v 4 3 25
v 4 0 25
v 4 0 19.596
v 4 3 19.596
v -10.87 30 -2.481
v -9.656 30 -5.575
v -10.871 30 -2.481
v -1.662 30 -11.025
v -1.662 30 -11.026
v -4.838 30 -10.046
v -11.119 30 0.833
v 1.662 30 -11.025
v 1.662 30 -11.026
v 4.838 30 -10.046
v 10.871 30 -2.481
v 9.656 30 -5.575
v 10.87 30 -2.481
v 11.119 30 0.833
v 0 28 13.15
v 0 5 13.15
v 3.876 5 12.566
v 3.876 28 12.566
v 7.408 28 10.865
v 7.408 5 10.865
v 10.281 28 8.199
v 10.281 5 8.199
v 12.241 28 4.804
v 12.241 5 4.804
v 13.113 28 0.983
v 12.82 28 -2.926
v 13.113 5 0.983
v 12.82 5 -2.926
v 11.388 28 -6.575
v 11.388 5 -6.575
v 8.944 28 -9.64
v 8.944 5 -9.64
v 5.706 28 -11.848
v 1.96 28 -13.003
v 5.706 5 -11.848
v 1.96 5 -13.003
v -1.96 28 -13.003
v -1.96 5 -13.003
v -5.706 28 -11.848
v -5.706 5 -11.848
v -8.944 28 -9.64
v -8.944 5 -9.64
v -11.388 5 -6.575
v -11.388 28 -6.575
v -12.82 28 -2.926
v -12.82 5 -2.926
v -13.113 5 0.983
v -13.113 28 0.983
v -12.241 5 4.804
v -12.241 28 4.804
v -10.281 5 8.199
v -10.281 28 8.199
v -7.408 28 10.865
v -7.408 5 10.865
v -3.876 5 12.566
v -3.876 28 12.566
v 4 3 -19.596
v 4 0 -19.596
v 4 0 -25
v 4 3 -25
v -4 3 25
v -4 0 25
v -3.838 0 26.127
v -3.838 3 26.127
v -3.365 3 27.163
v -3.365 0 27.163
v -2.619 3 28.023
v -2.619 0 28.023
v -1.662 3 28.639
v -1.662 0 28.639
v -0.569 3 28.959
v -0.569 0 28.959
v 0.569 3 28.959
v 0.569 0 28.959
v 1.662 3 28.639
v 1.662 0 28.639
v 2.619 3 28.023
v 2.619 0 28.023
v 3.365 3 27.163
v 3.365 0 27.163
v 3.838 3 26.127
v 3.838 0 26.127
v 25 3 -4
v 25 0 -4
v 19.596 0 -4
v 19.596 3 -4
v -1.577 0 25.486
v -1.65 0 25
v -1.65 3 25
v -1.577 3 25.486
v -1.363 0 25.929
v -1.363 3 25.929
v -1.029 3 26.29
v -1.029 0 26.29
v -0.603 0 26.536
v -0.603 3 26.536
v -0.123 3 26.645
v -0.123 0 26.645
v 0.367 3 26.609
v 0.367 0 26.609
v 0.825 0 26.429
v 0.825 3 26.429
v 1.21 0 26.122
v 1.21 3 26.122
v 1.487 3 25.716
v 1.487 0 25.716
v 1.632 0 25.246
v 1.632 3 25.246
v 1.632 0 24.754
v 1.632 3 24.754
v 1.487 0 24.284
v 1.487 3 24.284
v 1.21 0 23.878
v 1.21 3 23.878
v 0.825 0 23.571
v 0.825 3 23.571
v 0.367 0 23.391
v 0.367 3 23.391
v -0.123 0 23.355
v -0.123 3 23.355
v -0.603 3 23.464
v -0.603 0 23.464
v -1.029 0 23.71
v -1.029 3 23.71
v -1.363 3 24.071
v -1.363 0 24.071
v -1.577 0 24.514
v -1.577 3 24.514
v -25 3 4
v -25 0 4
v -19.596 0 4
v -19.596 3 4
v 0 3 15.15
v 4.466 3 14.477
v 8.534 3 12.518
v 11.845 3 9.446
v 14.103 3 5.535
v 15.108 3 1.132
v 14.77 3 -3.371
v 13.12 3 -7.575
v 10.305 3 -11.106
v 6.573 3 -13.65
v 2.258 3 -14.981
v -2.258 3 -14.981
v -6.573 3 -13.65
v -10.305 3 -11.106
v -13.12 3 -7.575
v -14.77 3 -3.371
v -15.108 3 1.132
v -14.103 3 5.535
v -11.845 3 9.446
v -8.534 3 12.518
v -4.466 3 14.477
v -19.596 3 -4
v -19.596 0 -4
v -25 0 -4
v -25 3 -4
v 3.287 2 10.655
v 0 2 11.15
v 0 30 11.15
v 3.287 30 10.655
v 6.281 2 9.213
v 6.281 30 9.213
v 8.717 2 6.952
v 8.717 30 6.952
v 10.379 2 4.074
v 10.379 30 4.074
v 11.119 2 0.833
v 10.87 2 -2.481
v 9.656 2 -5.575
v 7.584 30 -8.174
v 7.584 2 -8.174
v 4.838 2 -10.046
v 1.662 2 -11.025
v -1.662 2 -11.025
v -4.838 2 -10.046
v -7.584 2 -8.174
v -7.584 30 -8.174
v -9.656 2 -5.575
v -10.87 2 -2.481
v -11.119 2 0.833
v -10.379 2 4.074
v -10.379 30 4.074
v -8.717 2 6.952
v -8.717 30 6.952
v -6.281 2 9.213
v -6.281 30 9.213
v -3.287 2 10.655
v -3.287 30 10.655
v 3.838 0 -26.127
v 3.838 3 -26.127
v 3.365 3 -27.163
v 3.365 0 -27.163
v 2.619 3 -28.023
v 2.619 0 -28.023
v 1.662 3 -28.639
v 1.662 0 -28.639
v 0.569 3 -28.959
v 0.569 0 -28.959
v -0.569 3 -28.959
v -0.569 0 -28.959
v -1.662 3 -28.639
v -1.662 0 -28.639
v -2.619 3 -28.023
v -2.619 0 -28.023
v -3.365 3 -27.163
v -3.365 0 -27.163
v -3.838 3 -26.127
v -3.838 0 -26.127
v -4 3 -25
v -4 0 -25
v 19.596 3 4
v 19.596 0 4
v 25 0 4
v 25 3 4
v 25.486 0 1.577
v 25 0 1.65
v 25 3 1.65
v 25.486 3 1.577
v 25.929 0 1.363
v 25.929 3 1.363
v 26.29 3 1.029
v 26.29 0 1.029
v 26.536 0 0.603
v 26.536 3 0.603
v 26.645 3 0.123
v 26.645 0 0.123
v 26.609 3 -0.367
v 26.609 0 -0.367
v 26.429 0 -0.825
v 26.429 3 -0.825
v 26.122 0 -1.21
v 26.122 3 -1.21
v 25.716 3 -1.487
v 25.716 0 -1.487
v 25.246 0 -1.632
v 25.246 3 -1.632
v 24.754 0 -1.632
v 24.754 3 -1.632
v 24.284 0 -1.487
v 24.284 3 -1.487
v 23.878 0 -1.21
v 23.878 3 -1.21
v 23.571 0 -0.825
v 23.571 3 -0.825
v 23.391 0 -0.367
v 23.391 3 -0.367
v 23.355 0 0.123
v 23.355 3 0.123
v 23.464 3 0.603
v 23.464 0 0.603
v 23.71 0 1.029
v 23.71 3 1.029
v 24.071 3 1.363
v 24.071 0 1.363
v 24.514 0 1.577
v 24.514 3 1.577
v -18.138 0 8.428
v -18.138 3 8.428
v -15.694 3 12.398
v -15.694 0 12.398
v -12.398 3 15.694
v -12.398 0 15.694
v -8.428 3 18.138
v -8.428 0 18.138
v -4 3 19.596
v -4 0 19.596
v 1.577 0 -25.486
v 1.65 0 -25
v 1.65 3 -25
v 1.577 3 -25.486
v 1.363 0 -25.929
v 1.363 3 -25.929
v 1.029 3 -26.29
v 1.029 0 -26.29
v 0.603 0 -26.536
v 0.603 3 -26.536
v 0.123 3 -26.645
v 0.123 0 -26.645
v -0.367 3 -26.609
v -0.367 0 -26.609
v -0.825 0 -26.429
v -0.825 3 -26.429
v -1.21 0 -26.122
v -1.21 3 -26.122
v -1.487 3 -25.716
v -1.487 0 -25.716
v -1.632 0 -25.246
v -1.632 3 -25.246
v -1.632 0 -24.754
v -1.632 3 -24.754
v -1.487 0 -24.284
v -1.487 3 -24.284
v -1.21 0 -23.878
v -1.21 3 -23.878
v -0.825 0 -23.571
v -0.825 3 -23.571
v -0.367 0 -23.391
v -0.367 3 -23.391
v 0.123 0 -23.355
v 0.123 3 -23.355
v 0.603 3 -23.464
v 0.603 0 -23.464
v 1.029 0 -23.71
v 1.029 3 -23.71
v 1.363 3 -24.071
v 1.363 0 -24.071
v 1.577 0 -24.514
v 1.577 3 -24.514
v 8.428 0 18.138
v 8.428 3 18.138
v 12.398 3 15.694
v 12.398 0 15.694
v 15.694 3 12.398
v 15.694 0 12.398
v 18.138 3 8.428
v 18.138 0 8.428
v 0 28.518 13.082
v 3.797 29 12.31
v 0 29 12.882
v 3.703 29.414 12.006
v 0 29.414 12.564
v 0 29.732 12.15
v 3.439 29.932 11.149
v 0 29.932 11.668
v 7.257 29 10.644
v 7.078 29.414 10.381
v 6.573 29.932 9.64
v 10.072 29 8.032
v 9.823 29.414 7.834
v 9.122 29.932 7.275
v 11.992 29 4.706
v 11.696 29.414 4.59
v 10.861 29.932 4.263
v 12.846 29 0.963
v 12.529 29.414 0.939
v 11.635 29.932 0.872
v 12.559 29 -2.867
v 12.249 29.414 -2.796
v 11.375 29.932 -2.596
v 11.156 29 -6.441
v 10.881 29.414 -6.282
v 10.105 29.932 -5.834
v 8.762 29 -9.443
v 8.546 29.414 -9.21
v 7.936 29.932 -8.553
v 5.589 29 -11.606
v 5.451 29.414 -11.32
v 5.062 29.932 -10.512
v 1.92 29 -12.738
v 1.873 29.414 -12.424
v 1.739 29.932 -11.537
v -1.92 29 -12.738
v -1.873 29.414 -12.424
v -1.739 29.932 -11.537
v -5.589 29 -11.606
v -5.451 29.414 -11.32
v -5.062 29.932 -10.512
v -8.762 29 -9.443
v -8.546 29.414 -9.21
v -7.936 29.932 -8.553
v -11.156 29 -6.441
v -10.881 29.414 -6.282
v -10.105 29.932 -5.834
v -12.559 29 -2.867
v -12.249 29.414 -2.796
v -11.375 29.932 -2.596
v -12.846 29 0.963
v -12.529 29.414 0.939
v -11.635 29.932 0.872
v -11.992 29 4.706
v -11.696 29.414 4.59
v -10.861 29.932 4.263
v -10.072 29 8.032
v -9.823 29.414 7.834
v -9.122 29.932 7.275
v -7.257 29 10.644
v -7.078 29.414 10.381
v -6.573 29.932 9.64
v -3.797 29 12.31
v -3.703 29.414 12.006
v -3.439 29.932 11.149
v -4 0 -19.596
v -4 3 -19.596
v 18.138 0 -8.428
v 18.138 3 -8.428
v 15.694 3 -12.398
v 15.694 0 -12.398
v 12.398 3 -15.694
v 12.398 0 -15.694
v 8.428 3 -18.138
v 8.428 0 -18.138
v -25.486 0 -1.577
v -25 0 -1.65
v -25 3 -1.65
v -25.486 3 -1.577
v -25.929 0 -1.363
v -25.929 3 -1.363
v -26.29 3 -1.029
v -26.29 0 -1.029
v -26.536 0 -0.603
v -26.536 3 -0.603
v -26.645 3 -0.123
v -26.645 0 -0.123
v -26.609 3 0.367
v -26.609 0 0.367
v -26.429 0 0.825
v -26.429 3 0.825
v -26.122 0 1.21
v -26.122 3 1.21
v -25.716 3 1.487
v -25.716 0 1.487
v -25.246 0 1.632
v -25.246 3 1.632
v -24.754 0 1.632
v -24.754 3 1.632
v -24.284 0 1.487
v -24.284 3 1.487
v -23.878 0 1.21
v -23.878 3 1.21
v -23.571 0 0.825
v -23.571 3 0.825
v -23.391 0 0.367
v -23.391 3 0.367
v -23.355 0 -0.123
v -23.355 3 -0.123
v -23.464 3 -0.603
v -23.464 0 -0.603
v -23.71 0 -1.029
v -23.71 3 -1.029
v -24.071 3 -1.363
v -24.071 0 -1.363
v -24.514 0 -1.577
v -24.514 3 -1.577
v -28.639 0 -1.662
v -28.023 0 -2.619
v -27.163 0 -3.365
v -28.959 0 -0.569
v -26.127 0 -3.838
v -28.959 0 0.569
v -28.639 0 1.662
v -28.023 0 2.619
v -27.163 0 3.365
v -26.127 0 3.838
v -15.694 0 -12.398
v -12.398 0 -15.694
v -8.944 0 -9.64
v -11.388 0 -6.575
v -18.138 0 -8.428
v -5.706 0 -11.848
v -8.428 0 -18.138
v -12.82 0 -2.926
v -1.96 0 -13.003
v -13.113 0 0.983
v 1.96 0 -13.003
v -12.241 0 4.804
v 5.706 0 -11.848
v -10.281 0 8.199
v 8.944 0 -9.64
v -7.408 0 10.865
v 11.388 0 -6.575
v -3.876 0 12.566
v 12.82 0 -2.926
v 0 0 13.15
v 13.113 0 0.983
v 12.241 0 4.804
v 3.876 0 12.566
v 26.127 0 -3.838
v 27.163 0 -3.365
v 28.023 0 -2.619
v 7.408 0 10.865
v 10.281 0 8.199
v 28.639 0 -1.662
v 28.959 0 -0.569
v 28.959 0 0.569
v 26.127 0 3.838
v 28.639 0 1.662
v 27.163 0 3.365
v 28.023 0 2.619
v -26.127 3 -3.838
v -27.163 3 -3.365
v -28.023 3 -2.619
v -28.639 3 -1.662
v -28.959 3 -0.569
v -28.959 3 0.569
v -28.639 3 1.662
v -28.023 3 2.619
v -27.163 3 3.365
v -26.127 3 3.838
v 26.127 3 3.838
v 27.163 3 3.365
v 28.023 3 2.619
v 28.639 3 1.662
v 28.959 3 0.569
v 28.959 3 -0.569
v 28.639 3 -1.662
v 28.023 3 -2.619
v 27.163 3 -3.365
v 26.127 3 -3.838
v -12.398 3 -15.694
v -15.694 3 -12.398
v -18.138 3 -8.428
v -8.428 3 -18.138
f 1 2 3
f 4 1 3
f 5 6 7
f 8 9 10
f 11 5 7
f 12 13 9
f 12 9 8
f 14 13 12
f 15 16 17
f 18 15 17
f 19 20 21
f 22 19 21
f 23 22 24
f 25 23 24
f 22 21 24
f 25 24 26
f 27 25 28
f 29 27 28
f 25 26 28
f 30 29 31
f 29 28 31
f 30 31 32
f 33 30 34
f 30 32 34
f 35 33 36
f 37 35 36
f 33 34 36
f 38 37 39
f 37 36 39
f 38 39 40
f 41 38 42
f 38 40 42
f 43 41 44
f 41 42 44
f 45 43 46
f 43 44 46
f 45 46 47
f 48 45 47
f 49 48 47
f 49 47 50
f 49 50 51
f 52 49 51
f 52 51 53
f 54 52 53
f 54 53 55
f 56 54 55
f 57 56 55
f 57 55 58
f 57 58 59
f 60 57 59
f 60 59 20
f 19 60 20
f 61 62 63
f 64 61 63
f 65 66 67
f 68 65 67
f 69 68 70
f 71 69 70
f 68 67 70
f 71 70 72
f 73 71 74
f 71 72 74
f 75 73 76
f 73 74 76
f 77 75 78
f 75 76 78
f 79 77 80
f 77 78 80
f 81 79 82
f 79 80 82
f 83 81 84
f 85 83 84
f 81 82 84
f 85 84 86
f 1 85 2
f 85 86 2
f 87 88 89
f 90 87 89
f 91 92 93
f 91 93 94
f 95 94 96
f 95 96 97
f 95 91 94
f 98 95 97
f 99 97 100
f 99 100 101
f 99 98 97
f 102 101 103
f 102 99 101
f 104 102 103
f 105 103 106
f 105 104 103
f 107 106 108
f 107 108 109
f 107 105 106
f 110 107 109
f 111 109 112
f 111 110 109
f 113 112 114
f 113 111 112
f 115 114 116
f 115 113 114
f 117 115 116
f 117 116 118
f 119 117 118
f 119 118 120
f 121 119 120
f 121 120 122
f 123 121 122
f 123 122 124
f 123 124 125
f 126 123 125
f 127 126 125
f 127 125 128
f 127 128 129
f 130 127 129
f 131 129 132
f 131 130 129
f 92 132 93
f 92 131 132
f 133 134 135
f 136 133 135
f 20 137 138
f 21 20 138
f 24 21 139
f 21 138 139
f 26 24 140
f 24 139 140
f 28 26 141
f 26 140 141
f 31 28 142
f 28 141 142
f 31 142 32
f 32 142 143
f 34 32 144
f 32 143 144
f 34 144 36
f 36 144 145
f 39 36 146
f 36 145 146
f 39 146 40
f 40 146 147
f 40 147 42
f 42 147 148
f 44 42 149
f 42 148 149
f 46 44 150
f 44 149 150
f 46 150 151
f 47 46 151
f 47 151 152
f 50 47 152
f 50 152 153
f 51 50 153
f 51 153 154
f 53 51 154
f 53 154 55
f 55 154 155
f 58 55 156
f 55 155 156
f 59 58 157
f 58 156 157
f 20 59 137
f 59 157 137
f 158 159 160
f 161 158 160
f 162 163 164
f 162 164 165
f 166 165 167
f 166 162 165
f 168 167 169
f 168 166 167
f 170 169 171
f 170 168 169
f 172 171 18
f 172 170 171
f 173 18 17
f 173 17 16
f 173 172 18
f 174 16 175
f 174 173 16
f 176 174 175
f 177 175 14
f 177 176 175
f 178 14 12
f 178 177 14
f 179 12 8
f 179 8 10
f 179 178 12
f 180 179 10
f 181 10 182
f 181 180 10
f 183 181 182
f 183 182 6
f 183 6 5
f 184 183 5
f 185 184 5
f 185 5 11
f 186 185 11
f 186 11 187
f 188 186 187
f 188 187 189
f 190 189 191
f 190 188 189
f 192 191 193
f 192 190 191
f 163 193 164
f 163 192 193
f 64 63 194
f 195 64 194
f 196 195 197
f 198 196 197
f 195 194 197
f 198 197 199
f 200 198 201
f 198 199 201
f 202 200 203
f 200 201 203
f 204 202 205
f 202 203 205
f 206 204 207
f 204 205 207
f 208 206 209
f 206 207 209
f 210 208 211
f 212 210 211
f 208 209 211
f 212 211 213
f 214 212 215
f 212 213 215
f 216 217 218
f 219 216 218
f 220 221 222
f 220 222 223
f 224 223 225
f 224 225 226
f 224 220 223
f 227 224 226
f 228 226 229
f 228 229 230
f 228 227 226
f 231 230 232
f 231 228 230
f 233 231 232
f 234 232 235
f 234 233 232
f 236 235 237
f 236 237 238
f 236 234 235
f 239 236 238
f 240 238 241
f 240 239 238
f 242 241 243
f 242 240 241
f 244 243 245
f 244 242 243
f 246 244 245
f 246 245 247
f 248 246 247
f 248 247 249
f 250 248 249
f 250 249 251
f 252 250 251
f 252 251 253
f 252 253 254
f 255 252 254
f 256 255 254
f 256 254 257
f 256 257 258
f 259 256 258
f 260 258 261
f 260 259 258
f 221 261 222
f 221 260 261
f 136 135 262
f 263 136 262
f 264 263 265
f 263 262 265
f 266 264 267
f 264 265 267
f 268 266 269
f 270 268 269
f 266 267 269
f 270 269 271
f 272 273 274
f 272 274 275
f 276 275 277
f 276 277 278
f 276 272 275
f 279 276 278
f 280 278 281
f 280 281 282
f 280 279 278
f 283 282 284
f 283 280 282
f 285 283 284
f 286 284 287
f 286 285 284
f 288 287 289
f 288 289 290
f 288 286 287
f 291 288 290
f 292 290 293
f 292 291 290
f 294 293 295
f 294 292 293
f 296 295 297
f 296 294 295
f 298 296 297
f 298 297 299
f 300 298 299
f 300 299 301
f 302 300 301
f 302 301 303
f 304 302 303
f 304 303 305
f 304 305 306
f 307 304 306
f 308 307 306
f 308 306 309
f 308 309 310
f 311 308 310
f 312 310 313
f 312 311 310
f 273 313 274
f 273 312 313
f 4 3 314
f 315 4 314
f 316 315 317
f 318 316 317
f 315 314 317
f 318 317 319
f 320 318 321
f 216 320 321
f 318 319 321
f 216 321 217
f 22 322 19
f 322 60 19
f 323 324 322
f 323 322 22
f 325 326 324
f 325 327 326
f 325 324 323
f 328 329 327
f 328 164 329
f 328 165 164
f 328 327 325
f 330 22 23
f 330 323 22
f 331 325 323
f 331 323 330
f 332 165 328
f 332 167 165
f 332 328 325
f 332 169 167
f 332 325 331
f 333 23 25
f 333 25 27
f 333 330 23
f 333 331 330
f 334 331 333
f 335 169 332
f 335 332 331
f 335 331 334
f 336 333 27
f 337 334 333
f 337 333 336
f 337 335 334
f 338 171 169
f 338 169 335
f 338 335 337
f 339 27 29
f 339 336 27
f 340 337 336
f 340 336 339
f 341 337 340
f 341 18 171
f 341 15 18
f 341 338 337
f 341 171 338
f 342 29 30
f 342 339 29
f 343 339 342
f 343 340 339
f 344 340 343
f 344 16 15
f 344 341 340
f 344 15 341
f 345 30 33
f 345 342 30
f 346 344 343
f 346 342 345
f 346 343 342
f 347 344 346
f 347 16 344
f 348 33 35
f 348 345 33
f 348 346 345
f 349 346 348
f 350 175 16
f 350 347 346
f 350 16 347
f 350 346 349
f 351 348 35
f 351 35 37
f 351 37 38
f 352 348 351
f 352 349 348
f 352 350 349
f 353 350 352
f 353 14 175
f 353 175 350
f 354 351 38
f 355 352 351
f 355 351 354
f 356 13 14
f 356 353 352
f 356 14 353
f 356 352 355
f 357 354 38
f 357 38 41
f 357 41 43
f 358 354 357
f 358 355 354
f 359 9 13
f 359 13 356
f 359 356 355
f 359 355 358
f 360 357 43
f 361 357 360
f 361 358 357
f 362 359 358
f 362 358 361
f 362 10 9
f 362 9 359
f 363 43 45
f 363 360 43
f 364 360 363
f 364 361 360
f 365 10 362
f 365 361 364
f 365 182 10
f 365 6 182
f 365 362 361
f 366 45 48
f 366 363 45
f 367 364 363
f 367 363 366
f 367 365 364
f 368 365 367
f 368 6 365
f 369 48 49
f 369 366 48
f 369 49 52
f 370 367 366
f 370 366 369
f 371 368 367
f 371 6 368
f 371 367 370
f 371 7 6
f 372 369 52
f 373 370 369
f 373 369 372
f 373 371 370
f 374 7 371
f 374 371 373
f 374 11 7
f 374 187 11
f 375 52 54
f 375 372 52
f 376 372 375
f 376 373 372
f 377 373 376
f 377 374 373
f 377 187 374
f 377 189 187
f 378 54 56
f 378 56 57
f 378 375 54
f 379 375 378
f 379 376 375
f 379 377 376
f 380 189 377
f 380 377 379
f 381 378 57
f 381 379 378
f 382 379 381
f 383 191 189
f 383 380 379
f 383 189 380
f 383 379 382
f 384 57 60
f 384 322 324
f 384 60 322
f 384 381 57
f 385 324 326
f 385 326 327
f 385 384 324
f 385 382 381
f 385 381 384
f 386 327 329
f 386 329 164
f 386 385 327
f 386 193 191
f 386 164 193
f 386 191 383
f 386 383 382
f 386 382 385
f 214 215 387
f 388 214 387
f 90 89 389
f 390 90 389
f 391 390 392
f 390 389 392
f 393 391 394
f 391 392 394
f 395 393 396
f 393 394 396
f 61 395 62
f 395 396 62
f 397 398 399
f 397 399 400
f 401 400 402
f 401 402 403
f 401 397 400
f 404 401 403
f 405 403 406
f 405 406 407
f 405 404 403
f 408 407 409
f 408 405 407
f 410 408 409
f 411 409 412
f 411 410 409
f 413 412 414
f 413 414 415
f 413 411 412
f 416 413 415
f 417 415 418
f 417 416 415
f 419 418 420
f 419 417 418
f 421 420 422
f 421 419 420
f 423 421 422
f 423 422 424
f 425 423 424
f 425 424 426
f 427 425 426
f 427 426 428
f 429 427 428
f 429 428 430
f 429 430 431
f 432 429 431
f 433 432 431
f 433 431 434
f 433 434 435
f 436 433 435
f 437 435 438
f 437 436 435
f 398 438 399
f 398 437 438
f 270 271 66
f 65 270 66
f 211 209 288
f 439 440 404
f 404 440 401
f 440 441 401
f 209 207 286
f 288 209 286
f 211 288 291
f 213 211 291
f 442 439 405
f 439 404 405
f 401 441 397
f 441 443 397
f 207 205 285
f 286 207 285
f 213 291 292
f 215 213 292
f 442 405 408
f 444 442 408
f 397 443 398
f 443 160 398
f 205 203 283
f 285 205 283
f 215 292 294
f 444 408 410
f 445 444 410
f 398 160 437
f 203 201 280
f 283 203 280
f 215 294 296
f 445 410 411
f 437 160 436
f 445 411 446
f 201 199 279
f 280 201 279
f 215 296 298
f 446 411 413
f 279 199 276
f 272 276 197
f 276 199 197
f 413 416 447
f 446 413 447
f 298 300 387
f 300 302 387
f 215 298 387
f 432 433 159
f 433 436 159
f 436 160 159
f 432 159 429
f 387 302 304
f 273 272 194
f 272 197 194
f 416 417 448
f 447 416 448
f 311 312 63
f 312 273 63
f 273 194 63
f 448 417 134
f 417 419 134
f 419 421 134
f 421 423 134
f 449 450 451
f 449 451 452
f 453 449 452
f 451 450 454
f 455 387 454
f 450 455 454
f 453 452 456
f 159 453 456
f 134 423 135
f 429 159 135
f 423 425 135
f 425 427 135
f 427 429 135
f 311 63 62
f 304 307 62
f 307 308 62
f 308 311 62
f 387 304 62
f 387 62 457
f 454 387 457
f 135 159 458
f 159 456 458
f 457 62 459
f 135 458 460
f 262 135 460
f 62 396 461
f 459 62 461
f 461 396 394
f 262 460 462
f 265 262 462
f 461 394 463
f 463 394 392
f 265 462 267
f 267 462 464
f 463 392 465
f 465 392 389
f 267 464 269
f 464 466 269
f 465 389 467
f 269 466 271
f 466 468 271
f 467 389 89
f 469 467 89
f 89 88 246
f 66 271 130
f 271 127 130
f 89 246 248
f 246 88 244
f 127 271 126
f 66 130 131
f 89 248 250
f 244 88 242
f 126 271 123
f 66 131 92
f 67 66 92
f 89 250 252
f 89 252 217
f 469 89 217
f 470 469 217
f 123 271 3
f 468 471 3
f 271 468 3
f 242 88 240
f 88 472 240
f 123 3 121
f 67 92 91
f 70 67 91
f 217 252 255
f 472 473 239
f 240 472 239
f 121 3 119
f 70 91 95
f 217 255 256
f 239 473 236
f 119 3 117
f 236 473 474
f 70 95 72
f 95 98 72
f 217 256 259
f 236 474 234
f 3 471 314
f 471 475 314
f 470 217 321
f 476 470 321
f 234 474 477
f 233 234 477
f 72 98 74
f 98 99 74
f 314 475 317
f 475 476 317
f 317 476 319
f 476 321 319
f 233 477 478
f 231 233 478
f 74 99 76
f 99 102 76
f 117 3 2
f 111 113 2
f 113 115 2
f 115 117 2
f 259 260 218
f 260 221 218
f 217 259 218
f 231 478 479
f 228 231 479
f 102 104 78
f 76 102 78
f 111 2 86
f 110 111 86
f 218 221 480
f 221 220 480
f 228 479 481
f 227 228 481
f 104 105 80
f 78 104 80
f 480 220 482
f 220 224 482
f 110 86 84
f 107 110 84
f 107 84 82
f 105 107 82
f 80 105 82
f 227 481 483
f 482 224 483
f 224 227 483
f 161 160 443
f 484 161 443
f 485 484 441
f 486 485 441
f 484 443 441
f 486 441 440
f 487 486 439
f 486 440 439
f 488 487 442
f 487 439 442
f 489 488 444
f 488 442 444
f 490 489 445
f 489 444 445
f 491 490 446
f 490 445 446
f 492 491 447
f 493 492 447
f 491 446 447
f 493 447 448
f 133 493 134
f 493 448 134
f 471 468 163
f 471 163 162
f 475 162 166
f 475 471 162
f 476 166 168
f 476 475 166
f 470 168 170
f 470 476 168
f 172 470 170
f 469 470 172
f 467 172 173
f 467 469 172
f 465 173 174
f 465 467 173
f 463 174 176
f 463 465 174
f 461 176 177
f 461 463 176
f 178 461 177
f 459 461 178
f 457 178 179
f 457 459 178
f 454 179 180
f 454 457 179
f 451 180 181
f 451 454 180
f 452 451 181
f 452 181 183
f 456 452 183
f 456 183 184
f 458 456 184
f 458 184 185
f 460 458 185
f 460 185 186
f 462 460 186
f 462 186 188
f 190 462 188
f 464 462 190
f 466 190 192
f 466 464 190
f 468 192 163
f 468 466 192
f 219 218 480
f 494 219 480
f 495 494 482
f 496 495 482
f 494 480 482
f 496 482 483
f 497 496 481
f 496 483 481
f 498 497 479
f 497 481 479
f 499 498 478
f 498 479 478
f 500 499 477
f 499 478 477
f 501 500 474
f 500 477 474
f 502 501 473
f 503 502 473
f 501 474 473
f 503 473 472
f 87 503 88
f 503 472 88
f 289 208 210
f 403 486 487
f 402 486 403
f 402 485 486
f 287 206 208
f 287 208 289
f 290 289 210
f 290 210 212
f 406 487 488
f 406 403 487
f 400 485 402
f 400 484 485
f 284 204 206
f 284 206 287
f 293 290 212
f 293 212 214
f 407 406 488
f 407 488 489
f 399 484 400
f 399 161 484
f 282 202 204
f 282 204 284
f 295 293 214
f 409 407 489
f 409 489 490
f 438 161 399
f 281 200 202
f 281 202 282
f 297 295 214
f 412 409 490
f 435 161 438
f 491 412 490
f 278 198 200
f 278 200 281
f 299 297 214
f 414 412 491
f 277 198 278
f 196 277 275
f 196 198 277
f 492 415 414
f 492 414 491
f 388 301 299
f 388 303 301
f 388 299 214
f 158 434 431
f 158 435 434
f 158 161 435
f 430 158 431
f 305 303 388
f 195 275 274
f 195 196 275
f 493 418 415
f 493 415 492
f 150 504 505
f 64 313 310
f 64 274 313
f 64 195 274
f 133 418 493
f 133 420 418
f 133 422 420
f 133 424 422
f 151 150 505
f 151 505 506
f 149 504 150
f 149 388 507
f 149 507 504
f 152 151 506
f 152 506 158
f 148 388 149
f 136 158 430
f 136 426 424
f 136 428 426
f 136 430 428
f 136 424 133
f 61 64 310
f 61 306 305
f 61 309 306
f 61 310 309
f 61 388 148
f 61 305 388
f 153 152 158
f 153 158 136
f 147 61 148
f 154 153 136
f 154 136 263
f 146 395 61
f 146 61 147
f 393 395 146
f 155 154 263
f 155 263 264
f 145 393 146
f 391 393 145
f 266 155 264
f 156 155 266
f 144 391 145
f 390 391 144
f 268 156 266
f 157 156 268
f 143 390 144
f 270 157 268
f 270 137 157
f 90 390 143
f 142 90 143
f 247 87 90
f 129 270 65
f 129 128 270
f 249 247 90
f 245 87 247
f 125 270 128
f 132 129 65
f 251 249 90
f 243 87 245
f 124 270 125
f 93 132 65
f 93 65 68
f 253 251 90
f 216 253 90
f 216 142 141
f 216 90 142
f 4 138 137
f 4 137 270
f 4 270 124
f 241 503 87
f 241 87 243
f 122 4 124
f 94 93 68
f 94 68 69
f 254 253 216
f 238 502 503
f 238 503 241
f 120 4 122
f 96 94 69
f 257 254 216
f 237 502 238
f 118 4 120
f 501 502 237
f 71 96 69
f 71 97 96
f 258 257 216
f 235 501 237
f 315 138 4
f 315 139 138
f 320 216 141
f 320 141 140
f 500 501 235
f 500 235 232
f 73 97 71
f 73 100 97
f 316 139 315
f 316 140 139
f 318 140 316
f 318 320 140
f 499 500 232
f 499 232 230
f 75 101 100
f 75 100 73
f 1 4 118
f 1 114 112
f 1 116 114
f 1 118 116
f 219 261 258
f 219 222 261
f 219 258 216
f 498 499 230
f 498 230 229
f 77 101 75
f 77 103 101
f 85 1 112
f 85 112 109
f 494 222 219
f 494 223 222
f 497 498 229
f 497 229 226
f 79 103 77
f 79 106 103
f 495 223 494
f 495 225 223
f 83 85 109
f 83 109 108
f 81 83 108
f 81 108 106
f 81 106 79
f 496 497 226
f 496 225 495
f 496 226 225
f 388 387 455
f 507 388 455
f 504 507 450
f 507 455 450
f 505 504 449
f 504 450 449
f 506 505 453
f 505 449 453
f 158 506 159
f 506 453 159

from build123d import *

# Parameters (mm, degrees)
CIRCUNFERENCES_R     = 20
CIRCUNFERENCES_R_2   = 13.15
EXT_DEPTH            = 3
CIRCUNFERENCES_3_R   = 13.15
CIRCUNFERENCES_3_R_2 = 11.15
CENT_DEPTH           = 30
ARM_START            = -3
ARMS_R               = 1.65
ARM_DEPTH            = 3
CIRPATTERN1_COUNT    = 4
CHAMFER1_SIZE        = 2
CHAMFER2_SIZE        = 2
FILLET1_R            = 2


with BuildPart() as part:
    # Circunferences → EXT (new body)
    with BuildSketch(Plane(origin=(0, 0, 0), x_dir=(1, 0, 0), z_dir=(0, 1, 0))):
        with Locations(Location((0, 0, 0), (0, 0, 270))):
            Circle(CIRCUNFERENCES_R)
        with Locations(Location((0, 0, 0), (0, 0, 270))):
            Circle(CIRCUNFERENCES_R_2, mode=Mode.SUBTRACT)
    extrude(amount=EXT_DEPTH)

    # Circunferences<3> → CENT (add)
    with BuildSketch(Plane(origin=(0, 0, 0), x_dir=(1, 0, 0), z_dir=(0, 1, 0))):
        with Locations(Location((0, 0, 0), (0, 0, 270))):
            Circle(CIRCUNFERENCES_3_R)
        with Locations(Location((0, 0, 0), (0, 0, 270))):
            Circle(CIRCUNFERENCES_3_R_2, mode=Mode.SUBTRACT)
    extrude(amount=CENT_DEPTH)

    # ARMS → ARM (add)
    with BuildSketch(Plane(origin=(0, 3, 0), x_dir=(1, 0, 0), z_dir=(0, 1, 0)).offset(ARM_START)):
        with BuildLine():
            Line((25, 4), (19.595917942, 4))
            ThreePointArc((19.595917942, 4), (19.89872306, 2.01017924), (20, 0))
            ThreePointArc((20, 0), (19.89872306, -2.01017924), (19.595917942, -4))
            Line((19.595917942, -4), (25, -4))
            ThreePointArc((25, -4), (29, 0), (25, 4))
        make_face()
        with Locations(Location((25, 0, 0), (0, 0, 270))):
            Circle(ARMS_R, mode=Mode.SUBTRACT)
    arm = extrude(amount=ARM_DEPTH)

    # CirPattern1: ARM ×4 about axis
    cirpattern1_axis = Axis((0, 0, 0), (0, 1, 0))
    for i in range(1, CIRPATTERN1_COUNT):
        add(arm.rotate(cirpattern1_axis, i * 360 / CIRPATTERN1_COUNT))

    # Chamfer1
    chamfer1_edges = [part.edges().sort_by_distance(p)[0] for p in [
        (0, 0, -11.15),
    ]]
    chamfer(chamfer1_edges, length=CHAMFER1_SIZE)

    # Chamfer2
    chamfer2_edges = [part.edges().sort_by_distance(p)[0] for p in [
        (0, 3, -13.15),
    ]]
    chamfer(chamfer2_edges, length=CHAMFER2_SIZE)

    # Fillet1
    fillet1_edges = [part.edges().sort_by_distance(p)[0] for p in [
        (0, 30, -13.15),
    ]]
    fillet(fillet1_edges, radius=FILLET1_R - 0.0001)  # a hair under: the kernel refuses the full size


solid = part.part
